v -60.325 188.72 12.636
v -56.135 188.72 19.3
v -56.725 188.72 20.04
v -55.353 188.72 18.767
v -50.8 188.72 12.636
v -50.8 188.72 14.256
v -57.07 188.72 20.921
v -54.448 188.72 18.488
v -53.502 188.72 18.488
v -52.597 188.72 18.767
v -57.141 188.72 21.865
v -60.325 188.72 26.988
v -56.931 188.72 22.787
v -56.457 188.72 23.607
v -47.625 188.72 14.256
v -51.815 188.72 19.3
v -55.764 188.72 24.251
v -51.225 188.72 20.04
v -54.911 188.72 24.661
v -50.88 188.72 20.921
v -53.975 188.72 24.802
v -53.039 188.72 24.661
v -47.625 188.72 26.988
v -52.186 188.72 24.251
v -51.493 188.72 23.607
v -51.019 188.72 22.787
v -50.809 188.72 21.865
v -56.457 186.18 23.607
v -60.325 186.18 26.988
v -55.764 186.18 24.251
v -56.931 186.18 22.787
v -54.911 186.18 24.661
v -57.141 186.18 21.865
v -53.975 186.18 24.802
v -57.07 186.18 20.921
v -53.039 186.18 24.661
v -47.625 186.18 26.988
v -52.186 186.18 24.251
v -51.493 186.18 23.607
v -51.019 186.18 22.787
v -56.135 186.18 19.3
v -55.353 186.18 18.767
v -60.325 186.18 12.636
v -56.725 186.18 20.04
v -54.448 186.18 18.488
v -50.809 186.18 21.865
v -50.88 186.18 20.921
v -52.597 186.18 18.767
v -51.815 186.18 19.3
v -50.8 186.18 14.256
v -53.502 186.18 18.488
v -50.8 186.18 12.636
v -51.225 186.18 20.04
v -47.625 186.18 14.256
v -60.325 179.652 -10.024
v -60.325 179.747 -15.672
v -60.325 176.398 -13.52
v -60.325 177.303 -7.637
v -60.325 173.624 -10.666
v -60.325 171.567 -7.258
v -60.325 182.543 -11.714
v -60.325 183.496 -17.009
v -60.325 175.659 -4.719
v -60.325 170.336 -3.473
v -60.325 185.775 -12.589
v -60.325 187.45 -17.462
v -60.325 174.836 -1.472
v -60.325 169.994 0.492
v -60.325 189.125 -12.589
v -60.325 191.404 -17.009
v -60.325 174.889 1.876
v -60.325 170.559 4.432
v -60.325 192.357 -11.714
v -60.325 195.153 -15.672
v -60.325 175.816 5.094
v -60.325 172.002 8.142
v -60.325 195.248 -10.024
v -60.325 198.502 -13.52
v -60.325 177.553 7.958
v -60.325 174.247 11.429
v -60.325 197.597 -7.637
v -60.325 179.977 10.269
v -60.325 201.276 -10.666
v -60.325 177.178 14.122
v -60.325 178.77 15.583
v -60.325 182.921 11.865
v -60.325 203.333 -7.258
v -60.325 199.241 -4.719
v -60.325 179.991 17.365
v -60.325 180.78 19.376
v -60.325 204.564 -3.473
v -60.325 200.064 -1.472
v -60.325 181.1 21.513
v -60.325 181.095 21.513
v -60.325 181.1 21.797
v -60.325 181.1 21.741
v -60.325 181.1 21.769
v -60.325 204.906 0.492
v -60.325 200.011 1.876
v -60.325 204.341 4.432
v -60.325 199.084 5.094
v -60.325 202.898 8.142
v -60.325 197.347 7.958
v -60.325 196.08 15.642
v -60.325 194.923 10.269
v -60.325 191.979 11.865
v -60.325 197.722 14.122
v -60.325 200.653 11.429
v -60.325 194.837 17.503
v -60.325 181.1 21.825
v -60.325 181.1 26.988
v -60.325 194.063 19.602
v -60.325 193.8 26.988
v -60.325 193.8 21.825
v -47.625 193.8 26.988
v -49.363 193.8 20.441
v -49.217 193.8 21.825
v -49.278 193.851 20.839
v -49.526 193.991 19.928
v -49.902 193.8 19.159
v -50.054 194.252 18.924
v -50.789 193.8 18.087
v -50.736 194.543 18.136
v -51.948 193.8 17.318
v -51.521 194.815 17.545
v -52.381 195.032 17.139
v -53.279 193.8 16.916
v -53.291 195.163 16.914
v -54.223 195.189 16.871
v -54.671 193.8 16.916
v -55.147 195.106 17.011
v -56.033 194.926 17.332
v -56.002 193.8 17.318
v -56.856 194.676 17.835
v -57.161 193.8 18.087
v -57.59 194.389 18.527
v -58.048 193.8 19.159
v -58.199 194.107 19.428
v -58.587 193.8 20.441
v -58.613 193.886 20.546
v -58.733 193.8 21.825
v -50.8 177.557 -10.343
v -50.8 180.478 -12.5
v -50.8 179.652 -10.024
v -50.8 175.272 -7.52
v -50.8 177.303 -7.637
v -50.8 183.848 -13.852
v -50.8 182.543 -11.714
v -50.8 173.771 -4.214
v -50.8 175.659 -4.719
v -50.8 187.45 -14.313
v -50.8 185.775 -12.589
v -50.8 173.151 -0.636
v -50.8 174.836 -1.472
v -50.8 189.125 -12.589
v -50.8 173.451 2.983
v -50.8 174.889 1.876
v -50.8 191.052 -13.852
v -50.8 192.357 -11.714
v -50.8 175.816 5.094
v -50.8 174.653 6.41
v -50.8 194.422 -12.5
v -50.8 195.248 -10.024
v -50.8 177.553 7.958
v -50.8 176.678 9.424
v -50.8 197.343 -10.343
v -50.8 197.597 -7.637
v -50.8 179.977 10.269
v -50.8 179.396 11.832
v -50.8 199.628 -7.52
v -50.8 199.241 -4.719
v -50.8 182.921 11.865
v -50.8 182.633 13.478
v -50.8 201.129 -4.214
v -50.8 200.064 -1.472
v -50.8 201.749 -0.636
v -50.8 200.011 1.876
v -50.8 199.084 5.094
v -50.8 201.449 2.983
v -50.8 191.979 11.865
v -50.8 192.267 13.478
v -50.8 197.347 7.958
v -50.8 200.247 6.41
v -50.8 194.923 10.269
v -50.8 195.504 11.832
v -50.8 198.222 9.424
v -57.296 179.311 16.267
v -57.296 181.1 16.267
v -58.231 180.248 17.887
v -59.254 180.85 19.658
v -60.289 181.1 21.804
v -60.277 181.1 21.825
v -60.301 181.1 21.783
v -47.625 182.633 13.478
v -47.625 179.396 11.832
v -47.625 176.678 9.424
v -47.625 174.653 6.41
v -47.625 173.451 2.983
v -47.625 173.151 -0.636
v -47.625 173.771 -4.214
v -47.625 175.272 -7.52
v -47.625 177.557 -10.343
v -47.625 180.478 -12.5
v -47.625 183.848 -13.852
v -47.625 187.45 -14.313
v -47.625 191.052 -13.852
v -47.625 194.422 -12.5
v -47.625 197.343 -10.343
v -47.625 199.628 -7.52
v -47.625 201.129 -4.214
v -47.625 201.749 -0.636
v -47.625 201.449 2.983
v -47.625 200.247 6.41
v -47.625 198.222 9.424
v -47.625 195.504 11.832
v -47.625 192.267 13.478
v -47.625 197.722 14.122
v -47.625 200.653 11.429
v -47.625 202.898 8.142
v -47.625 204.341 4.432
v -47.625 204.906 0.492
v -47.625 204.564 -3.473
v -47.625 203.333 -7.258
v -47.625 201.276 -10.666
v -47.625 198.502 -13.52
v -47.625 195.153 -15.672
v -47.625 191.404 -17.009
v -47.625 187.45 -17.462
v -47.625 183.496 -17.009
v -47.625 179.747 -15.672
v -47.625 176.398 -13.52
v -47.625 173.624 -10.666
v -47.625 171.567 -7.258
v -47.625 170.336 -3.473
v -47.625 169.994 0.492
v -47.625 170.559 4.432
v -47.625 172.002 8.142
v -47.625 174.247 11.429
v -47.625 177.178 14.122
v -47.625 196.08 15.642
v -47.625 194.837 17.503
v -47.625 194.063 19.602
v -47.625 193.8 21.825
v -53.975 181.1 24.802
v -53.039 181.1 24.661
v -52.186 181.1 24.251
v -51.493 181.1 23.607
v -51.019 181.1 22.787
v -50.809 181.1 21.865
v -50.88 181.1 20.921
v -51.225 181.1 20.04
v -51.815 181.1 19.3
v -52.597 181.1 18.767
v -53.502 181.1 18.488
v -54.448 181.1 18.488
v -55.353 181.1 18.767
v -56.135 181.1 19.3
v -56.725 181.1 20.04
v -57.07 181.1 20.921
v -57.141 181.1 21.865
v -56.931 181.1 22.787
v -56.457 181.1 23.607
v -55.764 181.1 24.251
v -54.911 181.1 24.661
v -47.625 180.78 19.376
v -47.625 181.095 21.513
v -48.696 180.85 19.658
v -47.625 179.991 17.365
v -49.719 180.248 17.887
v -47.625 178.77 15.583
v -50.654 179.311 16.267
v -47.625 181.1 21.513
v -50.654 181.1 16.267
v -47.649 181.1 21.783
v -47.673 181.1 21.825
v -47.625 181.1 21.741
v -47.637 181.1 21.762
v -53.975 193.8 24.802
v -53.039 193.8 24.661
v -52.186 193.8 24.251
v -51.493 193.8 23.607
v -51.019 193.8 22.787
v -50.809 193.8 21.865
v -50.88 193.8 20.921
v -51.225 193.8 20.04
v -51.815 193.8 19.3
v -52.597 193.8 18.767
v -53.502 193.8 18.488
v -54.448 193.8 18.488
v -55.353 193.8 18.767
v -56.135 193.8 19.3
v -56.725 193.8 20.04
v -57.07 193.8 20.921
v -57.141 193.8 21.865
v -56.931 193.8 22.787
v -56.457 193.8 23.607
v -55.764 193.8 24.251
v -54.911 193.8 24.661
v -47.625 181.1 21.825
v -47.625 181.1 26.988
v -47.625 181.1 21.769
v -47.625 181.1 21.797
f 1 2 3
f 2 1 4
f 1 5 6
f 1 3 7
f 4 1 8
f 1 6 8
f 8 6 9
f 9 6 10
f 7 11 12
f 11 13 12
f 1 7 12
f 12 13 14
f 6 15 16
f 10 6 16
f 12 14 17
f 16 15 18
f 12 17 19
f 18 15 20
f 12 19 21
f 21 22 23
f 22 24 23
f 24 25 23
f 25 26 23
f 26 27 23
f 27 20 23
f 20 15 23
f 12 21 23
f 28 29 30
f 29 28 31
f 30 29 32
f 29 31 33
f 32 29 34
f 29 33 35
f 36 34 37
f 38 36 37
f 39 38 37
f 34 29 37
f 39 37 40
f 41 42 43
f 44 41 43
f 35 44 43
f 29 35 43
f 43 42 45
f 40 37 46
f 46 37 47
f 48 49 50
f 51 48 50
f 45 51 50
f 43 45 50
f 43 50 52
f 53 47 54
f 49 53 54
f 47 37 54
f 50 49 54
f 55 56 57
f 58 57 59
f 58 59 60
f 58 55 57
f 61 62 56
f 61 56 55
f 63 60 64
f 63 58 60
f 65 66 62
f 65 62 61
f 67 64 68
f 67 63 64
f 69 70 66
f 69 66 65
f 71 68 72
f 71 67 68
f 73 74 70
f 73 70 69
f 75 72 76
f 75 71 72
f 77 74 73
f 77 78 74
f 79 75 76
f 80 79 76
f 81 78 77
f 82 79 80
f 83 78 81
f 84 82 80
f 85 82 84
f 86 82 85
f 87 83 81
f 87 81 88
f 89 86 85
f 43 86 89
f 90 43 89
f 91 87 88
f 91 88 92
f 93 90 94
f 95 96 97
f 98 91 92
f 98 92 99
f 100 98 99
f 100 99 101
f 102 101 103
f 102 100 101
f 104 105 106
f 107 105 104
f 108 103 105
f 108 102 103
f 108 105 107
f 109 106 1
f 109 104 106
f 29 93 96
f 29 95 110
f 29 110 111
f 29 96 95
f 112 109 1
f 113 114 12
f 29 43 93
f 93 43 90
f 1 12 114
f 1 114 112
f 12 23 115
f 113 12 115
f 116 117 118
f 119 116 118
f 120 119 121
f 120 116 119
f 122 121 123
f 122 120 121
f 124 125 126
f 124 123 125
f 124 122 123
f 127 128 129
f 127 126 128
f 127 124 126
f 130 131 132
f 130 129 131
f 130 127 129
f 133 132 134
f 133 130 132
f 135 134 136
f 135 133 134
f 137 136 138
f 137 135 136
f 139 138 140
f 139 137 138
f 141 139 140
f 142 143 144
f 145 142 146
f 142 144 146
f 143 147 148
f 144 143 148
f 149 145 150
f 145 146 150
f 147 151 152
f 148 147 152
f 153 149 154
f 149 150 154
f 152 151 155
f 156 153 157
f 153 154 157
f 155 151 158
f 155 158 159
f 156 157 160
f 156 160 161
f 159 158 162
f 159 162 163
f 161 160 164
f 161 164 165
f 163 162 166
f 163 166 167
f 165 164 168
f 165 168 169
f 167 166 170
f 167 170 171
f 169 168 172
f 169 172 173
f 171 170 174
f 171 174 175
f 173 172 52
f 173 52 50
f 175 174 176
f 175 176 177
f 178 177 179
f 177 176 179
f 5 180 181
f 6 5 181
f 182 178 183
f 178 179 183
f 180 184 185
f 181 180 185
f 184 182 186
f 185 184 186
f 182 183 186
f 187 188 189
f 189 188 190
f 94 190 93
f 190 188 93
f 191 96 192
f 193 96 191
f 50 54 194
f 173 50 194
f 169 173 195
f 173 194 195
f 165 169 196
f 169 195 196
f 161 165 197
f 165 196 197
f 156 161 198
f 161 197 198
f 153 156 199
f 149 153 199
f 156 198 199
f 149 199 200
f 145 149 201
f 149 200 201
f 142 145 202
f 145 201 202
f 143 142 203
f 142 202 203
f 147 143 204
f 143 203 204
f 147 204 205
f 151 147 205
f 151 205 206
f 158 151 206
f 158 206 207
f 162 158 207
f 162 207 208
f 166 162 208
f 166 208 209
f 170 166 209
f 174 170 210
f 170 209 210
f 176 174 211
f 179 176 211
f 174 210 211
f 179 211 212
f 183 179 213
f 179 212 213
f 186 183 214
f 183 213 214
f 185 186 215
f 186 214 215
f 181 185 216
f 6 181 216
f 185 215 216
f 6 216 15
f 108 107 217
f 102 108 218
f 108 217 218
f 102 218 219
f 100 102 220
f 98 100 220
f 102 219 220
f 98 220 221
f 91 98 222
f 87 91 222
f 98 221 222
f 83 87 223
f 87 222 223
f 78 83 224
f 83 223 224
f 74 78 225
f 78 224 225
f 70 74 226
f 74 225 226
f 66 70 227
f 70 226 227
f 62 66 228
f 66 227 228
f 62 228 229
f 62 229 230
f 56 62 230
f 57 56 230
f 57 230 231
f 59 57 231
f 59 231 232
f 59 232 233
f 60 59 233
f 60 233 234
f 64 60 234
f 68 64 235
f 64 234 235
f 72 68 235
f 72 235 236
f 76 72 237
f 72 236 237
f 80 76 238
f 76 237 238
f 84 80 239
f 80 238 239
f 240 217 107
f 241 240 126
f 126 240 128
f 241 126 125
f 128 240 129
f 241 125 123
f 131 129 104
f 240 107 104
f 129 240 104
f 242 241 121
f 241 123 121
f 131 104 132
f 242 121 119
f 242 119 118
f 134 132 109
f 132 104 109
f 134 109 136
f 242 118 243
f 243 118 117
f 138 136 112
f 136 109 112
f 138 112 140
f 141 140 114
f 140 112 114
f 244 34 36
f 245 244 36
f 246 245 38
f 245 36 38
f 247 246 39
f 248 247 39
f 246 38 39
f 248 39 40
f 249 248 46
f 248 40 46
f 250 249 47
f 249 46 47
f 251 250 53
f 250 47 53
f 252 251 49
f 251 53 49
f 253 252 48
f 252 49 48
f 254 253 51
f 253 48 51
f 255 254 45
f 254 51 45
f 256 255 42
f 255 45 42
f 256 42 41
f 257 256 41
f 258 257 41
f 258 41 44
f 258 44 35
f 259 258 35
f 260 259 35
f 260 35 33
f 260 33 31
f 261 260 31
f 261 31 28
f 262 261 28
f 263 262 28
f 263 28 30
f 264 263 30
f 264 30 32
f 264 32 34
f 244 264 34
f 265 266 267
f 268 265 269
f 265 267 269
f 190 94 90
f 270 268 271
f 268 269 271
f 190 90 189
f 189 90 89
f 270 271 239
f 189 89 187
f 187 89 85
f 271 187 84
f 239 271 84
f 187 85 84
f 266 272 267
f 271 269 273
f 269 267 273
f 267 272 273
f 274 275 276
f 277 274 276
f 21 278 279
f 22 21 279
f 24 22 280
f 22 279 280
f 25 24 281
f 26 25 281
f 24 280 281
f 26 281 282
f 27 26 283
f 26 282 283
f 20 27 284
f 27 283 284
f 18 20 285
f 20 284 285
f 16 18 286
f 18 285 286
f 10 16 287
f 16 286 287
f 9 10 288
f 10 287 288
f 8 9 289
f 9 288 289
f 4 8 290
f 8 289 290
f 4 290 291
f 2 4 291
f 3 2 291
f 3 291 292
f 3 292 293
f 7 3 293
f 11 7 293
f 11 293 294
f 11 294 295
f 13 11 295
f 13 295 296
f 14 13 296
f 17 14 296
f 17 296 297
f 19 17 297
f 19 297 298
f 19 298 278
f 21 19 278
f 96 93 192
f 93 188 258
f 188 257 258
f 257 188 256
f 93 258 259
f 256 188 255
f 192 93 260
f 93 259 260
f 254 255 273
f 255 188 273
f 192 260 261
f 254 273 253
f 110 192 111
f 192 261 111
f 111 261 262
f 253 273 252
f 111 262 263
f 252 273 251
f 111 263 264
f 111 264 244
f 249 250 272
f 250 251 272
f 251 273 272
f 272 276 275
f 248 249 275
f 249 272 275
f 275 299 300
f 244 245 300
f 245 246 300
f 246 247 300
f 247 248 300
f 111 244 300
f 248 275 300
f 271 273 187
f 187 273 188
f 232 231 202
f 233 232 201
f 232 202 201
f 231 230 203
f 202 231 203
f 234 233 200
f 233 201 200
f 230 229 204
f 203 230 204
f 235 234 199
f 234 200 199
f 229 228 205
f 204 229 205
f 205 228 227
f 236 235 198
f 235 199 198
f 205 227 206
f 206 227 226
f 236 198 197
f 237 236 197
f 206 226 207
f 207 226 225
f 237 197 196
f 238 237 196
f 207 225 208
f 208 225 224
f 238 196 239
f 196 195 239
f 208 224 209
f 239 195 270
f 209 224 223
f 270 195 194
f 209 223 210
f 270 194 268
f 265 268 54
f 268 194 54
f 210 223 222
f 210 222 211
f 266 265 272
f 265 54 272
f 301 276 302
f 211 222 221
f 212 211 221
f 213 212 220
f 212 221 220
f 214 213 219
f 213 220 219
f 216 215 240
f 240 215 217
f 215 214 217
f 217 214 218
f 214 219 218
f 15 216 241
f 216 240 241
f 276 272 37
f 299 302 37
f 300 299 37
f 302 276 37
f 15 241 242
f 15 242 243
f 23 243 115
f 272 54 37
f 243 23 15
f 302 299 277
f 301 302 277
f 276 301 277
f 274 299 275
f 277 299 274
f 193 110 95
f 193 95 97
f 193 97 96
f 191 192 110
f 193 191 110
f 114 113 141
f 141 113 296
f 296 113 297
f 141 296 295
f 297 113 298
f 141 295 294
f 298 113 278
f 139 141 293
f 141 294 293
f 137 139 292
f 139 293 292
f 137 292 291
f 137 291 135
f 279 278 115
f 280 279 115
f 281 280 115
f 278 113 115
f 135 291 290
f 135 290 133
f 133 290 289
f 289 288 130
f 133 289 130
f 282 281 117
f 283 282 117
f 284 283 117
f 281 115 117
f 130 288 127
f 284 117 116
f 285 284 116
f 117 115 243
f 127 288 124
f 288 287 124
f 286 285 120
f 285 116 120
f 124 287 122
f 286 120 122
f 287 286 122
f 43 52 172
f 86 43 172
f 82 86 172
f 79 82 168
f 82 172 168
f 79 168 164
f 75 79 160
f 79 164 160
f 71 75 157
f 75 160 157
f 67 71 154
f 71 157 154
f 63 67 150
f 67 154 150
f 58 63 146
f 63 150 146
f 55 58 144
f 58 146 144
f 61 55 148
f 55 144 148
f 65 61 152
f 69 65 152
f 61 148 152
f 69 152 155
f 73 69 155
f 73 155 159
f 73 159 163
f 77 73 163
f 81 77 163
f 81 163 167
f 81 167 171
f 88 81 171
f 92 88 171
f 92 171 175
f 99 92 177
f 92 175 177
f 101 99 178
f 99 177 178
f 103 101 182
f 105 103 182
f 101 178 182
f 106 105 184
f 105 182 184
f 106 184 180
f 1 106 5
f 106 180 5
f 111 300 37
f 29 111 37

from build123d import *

# Parameters (mm, degrees)
BOSS_EXTRUDE1_DEPTH = 9.525
BOSS_EXTRUDE2_START = -3.175
BOSS_EXTRUDE2_DEPTH = 3.175
FILLET1_R           = 9.525
SKETCH2_R           = 4.7625
SKETCH2_R_2         = 3.175
CUT_EXTRUDE1_DEPTH  = 71.245753875
SKETCH2_4_R         = 3.175
CUT_EXTRUDE2_DEPTH  = 71.245753961
CUT_EXTRUDE4_START  = -12.7
SKETCH2_6_R         = 4.7625
SKETCH2_6_R_2       = 3.175
CUT_EXTRUDE4_DEPTH  = 58.545753961


with BuildPart() as part:
    # Sketch1 → Boss-Extrude1 (new body)
    with BuildSketch(Plane.ZY.offset(50.8)):
        with BuildLine():
            ThreePointArc((12.636340451, 186.18), (-12.7, 187.45), (12.636340451, 188.72))
            Line((12.636340451, 188.72), (26.9875, 188.72))
            Line((26.9875, 188.72), (26.9875, 193.8))
            Line((26.9875, 193.8), (16.267034341, 193.8))
            ThreePointArc((16.267034341, 193.8), (-17.4625, 187.45), (16.267034341, 181.1))
            Line((16.267034341, 181.1), (26.9875, 181.1))
            Line((26.9875, 181.1), (26.9875, 186.18))
            Line((26.9875, 186.18), (12.636340451, 186.18))
        make_face()
    extrude(amount=BOSS_EXTRUDE1_DEPTH)

    # Sketch1<4> → Boss-Extrude2 (add)
    with BuildSketch(Plane.ZY.offset(50.8).offset(BOSS_EXTRUDE2_START)):
        with BuildLine():
            Line((17.416256953, 186.18), (14.256444382, 186.18))
            ThreePointArc((14.256444382, 186.18), (-14.3129, 187.45), (14.256444382, 188.72))
            Line((14.256444382, 188.72), (17.416256953, 188.72))
            ThreePointArc((17.416256953, 188.72), (17.032105803, 191.303086834), (16.267034341, 193.8))
            ThreePointArc((16.267034341, 193.8), (-17.4625, 187.45), (16.267034341, 181.1))
            ThreePointArc((16.267034341, 181.1), (17.032105803, 183.596913166), (17.416256953, 186.18))
        make_face()
        with BuildLine():
            ThreePointArc((16.267034341, 193.8), (17.032105803, 191.303086834), (17.416256953, 188.72))
            Line((17.416256953, 188.72), (26.9875, 188.72))
            Line((26.9875, 188.72), (26.9875, 193.8))
            Line((26.9875, 193.8), (16.267034341, 193.8))
        make_face()
        with BuildLine():
            Line((26.9875, 186.18), (17.416256953, 186.18))
            ThreePointArc((17.416256953, 186.18), (17.032105803, 183.596913166), (16.267034341, 181.1))
            Line((16.267034341, 181.1), (26.9875, 181.1))
            Line((26.9875, 181.1), (26.9875, 186.18))
        make_face()
    extrude(amount=BOSS_EXTRUDE2_DEPTH)

    # Fillet1
    fillet1_edges = [part.edges().sort_by_distance(p)[0] for p in [
        (-53.975, 181.1, 16.267034341),
        (-53.975, 193.8, 16.267034341),
    ]]
    fillet(fillet1_edges, radius=FILLET1_R)

    # Sketch2 → Cut-Extrude1 (cut, through all)
    # profile 1 of 2: a face of its own
    with BuildSketch(Plane(origin=(0, 193.8, 0), x_dir=(1, 0, 0), z_dir=(0, 1, 0))):
        with Locations((-53.975, -21.62726717)):
            Circle(SKETCH2_R)
        with Locations((-53.975, -21.62726717)):
            Circle(SKETCH2_R_2, mode=Mode.SUBTRACT)
    # profile 2 of 2: a face of its own
    with BuildSketch(Plane(origin=(0, 193.8, 0), x_dir=(1, 0, 0), z_dir=(0, 1, 0))):
        with Locations((-53.975, -21.62726717)):
            Circle(SKETCH2_R_2)
    extrude(amount=CUT_EXTRUDE1_DEPTH, mode=Mode.SUBTRACT)

    # Sketch2<4> → Cut-Extrude2 (cut, through all)
    with BuildSketch(Plane(origin=(0, 193.8, 0), x_dir=(1, 0, 0), z_dir=(0, 1, 0))):
        with Locations(Location((-53.975, -21.62726717, 0), (0, 0, 270))):
            Circle(SKETCH2_4_R)
    extrude(amount=-CUT_EXTRUDE2_DEPTH, mode=Mode.SUBTRACT)

    # Sketch2<6> → Cut-Extrude4 (cut, through all)
    # profile 1 of 3: a face of its own
    with BuildSketch(Plane(origin=(0, 193.8, 0), x_dir=(1, 0, 0), z_dir=(0, 1, 0)).offset(CUT_EXTRUDE4_START)):
        Polygon((-60.325, -21.513289799), (-60.325, -21.741244542), (-57.296072999, -26.9875), (-50.653927001, -26.9875), (-47.625, -21.741244542), (-47.625, -21.513289799), (-50.653927001, -16.267034341), (-57.296072999, -16.267034341), align=None)
        with Locations((-53.975, -21.62726717)):
            Circle(SKETCH2_6_R, mode=Mode.SUBTRACT)
    # profile 2 of 3: a face of its own
    with BuildSketch(Plane(origin=(0, 193.8, 0), x_dir=(1, 0, 0), z_dir=(0, 1, 0)).offset(CUT_EXTRUDE4_START)):
        with Locations((-53.975, -21.62726717)):
            Circle(SKETCH2_6_R)
        with Locations(Location((-53.975, -21.62726717, 0), (0, 0, 270))):
            Circle(SKETCH2_6_R_2, mode=Mode.SUBTRACT)
    # profile 3 of 3: a face of its own
    with BuildSketch(Plane(origin=(0, 193.8, 0), x_dir=(1, 0, 0), z_dir=(0, 1, 0)).offset(CUT_EXTRUDE4_START)):
        with Locations(Location((-53.975, -21.62726717, 0), (0, 0, 270))):
            Circle(SKETCH2_6_R_2)
    extrude(amount=-CUT_EXTRUDE4_DEPTH, mode=Mode.SUBTRACT)


solid = part.part
